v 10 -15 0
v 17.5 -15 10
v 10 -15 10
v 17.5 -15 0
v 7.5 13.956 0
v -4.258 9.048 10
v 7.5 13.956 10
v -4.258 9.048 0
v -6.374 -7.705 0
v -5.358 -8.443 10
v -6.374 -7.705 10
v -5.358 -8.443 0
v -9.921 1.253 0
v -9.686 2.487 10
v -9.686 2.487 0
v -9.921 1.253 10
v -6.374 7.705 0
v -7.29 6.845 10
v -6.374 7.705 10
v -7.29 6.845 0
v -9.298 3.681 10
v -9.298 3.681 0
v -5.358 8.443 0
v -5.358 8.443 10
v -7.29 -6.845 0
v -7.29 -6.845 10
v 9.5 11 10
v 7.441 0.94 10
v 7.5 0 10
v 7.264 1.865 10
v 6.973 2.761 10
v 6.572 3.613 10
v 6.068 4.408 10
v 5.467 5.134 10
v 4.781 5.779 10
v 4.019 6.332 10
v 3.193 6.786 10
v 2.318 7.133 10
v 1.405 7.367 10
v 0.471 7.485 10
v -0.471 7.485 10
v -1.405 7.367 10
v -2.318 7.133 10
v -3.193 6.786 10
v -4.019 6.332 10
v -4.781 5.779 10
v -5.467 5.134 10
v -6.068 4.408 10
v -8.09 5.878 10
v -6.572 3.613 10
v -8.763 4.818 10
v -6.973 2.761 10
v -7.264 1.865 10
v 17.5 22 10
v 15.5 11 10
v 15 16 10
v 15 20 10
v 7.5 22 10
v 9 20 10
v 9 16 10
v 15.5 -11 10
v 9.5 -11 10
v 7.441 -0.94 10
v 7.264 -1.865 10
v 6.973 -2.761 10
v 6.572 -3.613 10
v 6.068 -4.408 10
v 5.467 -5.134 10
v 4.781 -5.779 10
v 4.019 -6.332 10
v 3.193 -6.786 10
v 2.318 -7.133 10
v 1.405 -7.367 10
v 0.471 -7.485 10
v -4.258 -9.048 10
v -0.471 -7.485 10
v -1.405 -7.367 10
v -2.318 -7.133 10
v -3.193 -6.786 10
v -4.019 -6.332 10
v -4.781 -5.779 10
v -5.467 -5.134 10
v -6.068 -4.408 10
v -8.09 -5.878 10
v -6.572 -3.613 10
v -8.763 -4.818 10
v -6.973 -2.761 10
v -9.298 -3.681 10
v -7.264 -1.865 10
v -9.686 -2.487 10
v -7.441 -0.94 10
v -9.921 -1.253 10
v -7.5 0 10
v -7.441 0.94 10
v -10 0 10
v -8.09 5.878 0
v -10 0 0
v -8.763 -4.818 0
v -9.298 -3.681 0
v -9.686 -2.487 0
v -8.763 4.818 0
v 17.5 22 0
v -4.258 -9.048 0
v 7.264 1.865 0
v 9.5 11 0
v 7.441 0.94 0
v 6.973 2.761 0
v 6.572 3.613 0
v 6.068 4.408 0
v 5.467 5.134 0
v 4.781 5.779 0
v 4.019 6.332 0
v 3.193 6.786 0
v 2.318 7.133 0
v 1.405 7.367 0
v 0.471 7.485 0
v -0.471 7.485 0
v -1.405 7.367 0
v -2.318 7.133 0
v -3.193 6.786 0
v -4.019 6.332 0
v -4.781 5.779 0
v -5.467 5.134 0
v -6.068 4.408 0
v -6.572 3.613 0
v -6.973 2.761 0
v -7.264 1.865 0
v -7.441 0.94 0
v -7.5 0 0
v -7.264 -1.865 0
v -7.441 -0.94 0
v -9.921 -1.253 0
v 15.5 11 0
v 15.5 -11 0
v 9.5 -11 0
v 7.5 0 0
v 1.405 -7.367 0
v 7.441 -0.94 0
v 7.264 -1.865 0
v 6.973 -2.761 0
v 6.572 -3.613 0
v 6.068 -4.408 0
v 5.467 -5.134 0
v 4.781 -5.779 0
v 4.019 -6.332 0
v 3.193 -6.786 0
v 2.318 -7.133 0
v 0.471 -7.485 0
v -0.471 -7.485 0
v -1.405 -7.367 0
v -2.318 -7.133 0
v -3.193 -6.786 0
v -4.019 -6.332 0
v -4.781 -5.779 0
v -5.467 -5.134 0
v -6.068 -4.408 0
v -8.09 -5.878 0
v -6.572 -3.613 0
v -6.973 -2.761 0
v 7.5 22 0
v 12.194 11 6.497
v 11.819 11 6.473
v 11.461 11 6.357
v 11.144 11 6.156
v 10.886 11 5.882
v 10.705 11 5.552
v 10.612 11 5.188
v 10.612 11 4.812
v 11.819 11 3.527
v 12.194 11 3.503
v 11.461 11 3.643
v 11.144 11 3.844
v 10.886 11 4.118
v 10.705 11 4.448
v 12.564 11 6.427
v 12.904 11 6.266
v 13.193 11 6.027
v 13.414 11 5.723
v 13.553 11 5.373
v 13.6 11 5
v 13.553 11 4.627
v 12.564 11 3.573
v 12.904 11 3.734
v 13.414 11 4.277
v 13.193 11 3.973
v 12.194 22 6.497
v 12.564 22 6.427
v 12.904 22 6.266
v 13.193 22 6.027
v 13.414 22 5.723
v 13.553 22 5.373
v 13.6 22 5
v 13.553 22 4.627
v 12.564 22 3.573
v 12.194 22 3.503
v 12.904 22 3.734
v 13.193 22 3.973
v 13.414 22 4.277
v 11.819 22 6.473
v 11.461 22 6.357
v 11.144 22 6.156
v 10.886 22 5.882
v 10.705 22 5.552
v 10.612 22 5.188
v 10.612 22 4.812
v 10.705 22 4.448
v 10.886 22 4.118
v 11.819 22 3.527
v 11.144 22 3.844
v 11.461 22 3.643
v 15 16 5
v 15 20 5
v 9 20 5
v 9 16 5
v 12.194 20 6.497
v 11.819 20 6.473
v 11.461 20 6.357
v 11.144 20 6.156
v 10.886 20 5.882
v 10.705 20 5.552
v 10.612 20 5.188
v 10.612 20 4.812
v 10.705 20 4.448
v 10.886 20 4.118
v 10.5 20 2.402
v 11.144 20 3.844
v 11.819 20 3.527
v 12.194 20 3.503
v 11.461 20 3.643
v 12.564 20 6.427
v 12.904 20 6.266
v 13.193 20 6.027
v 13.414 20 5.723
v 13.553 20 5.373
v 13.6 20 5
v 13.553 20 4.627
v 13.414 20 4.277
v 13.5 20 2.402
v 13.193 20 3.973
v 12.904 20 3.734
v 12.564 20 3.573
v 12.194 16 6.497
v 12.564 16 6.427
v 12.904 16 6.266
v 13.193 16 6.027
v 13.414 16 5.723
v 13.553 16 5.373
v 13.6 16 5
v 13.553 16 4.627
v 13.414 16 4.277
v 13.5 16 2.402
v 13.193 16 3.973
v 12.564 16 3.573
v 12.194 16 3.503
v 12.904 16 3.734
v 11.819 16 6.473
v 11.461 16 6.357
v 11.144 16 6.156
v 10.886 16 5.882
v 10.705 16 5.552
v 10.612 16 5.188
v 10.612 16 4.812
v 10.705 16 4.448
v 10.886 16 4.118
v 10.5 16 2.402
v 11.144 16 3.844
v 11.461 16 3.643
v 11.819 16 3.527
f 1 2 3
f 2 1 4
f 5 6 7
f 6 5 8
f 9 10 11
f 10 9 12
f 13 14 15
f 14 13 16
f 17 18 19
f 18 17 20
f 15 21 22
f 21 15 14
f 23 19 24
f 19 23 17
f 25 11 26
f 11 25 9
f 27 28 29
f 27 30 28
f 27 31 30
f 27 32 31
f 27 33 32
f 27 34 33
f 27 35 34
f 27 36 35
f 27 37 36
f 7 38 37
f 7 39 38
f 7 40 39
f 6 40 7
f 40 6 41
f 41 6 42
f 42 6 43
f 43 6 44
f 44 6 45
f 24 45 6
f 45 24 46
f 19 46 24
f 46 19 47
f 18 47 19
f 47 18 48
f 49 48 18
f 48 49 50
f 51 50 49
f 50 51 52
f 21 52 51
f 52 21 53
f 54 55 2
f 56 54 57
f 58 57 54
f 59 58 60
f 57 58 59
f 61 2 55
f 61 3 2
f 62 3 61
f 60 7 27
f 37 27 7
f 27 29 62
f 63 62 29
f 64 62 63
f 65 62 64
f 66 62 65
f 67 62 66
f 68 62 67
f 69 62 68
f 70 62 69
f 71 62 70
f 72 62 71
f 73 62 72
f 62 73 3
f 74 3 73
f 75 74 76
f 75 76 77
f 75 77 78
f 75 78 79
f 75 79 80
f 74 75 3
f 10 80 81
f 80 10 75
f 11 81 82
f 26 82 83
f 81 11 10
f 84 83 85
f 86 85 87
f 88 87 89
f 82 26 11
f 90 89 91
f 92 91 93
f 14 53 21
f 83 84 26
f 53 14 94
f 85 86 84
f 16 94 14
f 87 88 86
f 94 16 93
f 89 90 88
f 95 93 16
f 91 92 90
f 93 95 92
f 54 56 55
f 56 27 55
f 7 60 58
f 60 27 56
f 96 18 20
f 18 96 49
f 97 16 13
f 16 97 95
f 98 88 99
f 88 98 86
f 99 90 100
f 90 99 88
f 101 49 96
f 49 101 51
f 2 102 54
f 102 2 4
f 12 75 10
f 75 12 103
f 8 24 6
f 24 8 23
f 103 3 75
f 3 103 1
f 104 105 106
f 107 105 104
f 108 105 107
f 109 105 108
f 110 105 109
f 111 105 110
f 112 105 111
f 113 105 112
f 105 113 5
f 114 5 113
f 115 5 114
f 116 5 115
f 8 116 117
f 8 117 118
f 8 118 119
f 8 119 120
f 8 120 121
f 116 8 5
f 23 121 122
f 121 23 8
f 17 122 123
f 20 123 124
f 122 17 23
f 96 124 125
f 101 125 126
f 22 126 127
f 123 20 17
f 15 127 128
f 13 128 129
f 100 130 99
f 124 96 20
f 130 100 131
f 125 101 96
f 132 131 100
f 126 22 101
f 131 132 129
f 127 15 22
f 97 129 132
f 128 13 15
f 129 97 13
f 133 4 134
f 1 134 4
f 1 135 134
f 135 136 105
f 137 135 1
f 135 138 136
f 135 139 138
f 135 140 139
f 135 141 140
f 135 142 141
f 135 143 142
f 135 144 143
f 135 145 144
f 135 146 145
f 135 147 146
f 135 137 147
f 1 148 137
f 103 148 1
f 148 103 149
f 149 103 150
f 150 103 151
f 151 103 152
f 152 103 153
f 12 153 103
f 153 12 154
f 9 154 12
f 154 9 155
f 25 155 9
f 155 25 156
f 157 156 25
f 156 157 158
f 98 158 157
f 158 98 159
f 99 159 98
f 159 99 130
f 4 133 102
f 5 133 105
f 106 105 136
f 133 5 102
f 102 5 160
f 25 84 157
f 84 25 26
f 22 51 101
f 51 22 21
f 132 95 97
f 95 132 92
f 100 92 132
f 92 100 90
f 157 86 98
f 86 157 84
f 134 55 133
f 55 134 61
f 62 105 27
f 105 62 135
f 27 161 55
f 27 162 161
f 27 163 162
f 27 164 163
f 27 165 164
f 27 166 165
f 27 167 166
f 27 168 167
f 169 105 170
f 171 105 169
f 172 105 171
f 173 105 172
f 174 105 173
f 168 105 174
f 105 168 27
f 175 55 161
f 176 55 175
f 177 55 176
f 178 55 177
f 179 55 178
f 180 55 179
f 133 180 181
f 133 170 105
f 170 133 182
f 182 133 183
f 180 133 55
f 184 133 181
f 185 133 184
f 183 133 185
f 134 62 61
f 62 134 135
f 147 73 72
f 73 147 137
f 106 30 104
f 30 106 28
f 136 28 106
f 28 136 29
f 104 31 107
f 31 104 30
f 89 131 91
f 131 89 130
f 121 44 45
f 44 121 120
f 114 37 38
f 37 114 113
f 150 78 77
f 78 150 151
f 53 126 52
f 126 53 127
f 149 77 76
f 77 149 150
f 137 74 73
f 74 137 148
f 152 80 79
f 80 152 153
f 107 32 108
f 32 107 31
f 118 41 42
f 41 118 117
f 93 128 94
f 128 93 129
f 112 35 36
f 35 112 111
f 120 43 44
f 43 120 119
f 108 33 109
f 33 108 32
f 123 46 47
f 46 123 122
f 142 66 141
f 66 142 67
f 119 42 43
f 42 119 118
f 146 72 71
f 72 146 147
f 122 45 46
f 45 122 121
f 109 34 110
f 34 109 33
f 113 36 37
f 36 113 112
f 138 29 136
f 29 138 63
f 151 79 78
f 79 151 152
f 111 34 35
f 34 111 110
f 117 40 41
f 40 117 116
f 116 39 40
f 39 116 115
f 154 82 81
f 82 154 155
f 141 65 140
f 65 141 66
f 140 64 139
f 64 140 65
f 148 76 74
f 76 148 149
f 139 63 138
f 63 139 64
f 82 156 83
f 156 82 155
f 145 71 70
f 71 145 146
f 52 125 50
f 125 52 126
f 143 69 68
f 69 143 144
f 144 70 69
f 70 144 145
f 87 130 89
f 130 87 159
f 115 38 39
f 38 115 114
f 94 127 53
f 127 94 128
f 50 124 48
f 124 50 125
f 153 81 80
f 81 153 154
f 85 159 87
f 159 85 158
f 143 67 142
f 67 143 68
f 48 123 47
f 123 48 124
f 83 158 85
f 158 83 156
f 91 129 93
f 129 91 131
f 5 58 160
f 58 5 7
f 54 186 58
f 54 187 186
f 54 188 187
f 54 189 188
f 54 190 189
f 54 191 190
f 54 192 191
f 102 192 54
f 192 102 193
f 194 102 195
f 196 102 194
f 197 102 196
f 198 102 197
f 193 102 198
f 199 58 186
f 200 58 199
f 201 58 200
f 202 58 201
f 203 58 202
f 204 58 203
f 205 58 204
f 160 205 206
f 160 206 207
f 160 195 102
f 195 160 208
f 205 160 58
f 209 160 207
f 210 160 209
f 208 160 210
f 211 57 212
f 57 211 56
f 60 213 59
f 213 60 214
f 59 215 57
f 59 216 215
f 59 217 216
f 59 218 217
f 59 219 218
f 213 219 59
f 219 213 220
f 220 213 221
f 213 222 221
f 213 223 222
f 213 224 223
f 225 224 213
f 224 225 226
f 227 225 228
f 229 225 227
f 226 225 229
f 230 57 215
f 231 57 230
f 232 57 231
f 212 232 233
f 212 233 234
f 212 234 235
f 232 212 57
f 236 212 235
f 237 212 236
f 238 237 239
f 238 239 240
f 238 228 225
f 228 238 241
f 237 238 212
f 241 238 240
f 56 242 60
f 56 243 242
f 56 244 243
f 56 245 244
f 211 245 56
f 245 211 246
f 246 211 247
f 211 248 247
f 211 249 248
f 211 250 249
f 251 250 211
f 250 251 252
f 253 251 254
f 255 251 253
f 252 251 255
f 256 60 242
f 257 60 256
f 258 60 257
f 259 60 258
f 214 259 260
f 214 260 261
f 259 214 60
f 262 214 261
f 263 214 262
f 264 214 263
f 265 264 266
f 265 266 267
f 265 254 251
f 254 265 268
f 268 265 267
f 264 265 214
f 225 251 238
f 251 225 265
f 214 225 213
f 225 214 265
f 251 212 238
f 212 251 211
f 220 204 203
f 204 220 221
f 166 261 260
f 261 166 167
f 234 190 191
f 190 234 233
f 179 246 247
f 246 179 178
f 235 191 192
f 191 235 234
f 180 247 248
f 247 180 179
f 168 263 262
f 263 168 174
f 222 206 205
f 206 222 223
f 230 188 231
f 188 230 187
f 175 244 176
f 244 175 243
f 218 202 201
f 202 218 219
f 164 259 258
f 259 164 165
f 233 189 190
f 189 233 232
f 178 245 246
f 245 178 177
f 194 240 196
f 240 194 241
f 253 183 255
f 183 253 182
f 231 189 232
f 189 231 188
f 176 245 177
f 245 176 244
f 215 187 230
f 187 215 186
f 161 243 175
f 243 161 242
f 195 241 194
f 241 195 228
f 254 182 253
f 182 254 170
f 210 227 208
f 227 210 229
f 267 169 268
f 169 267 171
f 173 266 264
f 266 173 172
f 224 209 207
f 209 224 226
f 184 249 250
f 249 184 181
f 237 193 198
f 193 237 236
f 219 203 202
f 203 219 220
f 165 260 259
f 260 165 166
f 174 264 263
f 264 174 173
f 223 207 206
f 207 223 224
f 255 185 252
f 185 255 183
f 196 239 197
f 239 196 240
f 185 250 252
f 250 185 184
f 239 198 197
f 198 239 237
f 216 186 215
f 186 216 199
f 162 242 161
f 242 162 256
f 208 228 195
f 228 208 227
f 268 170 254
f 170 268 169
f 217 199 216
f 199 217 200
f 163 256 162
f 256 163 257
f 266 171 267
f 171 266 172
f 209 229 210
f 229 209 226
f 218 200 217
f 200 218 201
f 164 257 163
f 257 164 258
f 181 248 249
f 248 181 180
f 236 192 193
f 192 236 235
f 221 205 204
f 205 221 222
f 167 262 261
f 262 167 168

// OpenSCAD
//Polargraph Depth setting tool
//Copyright Mark Benson 2016 CCNC 2016

//Use this to set the pen at the correct height in the pen holder.

//push fit pen collar from gondola
/*    difference()
    {
        cylinder(r=20/2,h=10,$fn=50);
        cylinder(r=15/2,h=10,$fn=50);
    }*/

difference()
{
    //body of depth setting tool    
    union()
    {
        difference()
        {
            //body
            hull()
            {
                translate([10,-15,0])
                cube([7.5,30,10]);
        
                cylinder(r=20/2,h=10,$fn=50);
        
            }
            
            //slot
            translate([9.5,-11,0])
            cube([6,22,10]);
            
            //hole
            cylinder(r=15/2,h=10,$fn=50);
        }

    //screw lock on side of body
    translate([7.5,12,0])
    cube([10,10,10]);
    }
    
//Nut slot cutout
translate([15-6,16,5])
cube([6,4,10]);

//Nut cutout
translate([15-6/2,20,5])
rotate([90,0,0])
cylinder(d=6,h=4,$fn=6);

//Screw hole cutout
translate([15-5.8/2,25,5])
rotate([90,0,0])
cylinder(d=3,h=30,$fn=25);
}


/*
//slide
rotate([90,90,0])
union()
{
translate([10,-10,-90])
cube([4.5,19.8,100]);

translate([-8,-10,-90])
cube([18,19.8,4.5]);
}*/
